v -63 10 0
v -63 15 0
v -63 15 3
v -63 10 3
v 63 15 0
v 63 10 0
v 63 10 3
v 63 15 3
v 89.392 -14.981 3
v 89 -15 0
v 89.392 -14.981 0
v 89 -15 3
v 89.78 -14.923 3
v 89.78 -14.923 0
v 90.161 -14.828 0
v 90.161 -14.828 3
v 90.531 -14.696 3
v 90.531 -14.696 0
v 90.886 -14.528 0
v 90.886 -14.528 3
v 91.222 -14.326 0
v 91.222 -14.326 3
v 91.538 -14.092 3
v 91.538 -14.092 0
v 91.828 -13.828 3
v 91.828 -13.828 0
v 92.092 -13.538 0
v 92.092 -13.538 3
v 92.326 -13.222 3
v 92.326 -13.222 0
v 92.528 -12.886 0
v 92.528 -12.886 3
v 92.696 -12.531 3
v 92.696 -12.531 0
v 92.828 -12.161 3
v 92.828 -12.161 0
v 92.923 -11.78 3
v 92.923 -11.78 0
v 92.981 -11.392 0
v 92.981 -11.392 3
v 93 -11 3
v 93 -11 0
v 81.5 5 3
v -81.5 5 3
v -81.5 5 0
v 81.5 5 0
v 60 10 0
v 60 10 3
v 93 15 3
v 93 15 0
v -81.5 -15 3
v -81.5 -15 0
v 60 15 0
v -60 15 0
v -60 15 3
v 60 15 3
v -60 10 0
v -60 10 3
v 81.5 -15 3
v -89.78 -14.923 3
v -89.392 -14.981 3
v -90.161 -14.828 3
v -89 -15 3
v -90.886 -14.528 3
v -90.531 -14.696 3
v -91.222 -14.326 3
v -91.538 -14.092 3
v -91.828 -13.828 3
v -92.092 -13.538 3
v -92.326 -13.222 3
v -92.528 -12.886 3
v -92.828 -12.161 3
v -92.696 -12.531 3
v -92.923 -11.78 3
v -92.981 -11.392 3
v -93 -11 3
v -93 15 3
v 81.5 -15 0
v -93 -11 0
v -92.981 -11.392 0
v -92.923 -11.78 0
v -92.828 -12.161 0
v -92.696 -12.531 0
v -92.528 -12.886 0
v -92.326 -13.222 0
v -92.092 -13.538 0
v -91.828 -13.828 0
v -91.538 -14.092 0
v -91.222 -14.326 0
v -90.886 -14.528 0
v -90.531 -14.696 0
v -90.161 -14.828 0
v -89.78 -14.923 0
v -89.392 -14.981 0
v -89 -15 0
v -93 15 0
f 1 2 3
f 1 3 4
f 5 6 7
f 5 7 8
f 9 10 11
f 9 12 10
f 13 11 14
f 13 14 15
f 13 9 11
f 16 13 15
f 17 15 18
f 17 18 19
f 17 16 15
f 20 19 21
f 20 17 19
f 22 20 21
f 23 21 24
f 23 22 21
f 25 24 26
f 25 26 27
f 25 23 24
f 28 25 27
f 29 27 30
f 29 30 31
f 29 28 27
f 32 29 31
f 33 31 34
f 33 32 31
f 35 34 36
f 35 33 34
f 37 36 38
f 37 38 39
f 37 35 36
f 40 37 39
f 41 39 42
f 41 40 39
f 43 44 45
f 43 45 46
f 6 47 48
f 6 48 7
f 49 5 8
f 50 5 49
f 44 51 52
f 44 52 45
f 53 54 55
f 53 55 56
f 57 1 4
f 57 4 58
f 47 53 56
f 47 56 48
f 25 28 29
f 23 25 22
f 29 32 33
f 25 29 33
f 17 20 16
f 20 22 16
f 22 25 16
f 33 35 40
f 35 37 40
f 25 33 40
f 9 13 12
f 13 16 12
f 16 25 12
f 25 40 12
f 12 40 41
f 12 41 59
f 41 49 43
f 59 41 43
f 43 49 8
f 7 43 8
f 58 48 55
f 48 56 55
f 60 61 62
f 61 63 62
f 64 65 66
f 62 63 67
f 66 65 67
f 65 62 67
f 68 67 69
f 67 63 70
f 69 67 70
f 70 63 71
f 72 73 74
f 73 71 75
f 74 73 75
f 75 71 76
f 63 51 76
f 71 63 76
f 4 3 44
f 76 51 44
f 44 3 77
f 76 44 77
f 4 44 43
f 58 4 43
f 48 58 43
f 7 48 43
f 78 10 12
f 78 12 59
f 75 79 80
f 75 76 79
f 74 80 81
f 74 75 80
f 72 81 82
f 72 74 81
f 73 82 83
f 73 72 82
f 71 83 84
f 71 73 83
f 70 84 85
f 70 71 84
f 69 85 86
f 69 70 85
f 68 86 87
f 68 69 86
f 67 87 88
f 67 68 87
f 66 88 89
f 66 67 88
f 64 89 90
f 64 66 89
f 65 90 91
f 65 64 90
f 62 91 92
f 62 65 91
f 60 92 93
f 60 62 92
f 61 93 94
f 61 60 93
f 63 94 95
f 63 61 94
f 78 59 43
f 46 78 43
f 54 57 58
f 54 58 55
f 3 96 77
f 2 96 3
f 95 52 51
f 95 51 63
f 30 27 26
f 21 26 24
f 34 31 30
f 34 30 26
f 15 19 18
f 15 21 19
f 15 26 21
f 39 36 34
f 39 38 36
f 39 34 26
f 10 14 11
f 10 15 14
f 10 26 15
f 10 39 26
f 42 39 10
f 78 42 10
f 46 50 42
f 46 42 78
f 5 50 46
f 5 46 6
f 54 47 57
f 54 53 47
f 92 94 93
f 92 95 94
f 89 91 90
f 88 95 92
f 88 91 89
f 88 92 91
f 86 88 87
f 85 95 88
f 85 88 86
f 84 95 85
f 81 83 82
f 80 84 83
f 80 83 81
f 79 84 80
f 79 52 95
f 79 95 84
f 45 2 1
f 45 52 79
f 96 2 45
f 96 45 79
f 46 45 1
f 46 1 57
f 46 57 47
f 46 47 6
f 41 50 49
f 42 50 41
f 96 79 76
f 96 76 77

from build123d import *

# Parameters (mm, degrees)
BOSS_EXTRUDE1_DEPTH = 3
SKETCH2_W           = 163
SKETCH2_H           = 40
CUT_EXTRUDE1_DEPTH  = 3
FILLET1_R           = 4


with BuildPart() as part:
    # Sketch1 → Boss-Extrude1 (new body)
    with BuildSketch(Plane.XY):
        Polygon((-93, 15), (-63, 15), (-63, 10), (-60, 10), (-60, 15), (60, 15), (60, 10), (63, 10), (63, 15), (93, 15), (93, -15), (-93, -15), align=None)
    extrude(amount=BOSS_EXTRUDE1_DEPTH)

    # Sketch2 → Cut-Extrude1 (cut)
    with BuildSketch(Plane.XY.offset(3)):
        with Locations((0, -15)):
            Rectangle(SKETCH2_W, SKETCH2_H)
    extrude(amount=-CUT_EXTRUDE1_DEPTH, mode=Mode.SUBTRACT)

    # Fillet1
    fillet1_edges = [part.edges().sort_by_distance(p)[0] for p in [
        (93, -15, 1.5),
        (-93, -15, 1.5),
    ]]
    fillet(fillet1_edges, radius=FILLET1_R)


solid = part.part
